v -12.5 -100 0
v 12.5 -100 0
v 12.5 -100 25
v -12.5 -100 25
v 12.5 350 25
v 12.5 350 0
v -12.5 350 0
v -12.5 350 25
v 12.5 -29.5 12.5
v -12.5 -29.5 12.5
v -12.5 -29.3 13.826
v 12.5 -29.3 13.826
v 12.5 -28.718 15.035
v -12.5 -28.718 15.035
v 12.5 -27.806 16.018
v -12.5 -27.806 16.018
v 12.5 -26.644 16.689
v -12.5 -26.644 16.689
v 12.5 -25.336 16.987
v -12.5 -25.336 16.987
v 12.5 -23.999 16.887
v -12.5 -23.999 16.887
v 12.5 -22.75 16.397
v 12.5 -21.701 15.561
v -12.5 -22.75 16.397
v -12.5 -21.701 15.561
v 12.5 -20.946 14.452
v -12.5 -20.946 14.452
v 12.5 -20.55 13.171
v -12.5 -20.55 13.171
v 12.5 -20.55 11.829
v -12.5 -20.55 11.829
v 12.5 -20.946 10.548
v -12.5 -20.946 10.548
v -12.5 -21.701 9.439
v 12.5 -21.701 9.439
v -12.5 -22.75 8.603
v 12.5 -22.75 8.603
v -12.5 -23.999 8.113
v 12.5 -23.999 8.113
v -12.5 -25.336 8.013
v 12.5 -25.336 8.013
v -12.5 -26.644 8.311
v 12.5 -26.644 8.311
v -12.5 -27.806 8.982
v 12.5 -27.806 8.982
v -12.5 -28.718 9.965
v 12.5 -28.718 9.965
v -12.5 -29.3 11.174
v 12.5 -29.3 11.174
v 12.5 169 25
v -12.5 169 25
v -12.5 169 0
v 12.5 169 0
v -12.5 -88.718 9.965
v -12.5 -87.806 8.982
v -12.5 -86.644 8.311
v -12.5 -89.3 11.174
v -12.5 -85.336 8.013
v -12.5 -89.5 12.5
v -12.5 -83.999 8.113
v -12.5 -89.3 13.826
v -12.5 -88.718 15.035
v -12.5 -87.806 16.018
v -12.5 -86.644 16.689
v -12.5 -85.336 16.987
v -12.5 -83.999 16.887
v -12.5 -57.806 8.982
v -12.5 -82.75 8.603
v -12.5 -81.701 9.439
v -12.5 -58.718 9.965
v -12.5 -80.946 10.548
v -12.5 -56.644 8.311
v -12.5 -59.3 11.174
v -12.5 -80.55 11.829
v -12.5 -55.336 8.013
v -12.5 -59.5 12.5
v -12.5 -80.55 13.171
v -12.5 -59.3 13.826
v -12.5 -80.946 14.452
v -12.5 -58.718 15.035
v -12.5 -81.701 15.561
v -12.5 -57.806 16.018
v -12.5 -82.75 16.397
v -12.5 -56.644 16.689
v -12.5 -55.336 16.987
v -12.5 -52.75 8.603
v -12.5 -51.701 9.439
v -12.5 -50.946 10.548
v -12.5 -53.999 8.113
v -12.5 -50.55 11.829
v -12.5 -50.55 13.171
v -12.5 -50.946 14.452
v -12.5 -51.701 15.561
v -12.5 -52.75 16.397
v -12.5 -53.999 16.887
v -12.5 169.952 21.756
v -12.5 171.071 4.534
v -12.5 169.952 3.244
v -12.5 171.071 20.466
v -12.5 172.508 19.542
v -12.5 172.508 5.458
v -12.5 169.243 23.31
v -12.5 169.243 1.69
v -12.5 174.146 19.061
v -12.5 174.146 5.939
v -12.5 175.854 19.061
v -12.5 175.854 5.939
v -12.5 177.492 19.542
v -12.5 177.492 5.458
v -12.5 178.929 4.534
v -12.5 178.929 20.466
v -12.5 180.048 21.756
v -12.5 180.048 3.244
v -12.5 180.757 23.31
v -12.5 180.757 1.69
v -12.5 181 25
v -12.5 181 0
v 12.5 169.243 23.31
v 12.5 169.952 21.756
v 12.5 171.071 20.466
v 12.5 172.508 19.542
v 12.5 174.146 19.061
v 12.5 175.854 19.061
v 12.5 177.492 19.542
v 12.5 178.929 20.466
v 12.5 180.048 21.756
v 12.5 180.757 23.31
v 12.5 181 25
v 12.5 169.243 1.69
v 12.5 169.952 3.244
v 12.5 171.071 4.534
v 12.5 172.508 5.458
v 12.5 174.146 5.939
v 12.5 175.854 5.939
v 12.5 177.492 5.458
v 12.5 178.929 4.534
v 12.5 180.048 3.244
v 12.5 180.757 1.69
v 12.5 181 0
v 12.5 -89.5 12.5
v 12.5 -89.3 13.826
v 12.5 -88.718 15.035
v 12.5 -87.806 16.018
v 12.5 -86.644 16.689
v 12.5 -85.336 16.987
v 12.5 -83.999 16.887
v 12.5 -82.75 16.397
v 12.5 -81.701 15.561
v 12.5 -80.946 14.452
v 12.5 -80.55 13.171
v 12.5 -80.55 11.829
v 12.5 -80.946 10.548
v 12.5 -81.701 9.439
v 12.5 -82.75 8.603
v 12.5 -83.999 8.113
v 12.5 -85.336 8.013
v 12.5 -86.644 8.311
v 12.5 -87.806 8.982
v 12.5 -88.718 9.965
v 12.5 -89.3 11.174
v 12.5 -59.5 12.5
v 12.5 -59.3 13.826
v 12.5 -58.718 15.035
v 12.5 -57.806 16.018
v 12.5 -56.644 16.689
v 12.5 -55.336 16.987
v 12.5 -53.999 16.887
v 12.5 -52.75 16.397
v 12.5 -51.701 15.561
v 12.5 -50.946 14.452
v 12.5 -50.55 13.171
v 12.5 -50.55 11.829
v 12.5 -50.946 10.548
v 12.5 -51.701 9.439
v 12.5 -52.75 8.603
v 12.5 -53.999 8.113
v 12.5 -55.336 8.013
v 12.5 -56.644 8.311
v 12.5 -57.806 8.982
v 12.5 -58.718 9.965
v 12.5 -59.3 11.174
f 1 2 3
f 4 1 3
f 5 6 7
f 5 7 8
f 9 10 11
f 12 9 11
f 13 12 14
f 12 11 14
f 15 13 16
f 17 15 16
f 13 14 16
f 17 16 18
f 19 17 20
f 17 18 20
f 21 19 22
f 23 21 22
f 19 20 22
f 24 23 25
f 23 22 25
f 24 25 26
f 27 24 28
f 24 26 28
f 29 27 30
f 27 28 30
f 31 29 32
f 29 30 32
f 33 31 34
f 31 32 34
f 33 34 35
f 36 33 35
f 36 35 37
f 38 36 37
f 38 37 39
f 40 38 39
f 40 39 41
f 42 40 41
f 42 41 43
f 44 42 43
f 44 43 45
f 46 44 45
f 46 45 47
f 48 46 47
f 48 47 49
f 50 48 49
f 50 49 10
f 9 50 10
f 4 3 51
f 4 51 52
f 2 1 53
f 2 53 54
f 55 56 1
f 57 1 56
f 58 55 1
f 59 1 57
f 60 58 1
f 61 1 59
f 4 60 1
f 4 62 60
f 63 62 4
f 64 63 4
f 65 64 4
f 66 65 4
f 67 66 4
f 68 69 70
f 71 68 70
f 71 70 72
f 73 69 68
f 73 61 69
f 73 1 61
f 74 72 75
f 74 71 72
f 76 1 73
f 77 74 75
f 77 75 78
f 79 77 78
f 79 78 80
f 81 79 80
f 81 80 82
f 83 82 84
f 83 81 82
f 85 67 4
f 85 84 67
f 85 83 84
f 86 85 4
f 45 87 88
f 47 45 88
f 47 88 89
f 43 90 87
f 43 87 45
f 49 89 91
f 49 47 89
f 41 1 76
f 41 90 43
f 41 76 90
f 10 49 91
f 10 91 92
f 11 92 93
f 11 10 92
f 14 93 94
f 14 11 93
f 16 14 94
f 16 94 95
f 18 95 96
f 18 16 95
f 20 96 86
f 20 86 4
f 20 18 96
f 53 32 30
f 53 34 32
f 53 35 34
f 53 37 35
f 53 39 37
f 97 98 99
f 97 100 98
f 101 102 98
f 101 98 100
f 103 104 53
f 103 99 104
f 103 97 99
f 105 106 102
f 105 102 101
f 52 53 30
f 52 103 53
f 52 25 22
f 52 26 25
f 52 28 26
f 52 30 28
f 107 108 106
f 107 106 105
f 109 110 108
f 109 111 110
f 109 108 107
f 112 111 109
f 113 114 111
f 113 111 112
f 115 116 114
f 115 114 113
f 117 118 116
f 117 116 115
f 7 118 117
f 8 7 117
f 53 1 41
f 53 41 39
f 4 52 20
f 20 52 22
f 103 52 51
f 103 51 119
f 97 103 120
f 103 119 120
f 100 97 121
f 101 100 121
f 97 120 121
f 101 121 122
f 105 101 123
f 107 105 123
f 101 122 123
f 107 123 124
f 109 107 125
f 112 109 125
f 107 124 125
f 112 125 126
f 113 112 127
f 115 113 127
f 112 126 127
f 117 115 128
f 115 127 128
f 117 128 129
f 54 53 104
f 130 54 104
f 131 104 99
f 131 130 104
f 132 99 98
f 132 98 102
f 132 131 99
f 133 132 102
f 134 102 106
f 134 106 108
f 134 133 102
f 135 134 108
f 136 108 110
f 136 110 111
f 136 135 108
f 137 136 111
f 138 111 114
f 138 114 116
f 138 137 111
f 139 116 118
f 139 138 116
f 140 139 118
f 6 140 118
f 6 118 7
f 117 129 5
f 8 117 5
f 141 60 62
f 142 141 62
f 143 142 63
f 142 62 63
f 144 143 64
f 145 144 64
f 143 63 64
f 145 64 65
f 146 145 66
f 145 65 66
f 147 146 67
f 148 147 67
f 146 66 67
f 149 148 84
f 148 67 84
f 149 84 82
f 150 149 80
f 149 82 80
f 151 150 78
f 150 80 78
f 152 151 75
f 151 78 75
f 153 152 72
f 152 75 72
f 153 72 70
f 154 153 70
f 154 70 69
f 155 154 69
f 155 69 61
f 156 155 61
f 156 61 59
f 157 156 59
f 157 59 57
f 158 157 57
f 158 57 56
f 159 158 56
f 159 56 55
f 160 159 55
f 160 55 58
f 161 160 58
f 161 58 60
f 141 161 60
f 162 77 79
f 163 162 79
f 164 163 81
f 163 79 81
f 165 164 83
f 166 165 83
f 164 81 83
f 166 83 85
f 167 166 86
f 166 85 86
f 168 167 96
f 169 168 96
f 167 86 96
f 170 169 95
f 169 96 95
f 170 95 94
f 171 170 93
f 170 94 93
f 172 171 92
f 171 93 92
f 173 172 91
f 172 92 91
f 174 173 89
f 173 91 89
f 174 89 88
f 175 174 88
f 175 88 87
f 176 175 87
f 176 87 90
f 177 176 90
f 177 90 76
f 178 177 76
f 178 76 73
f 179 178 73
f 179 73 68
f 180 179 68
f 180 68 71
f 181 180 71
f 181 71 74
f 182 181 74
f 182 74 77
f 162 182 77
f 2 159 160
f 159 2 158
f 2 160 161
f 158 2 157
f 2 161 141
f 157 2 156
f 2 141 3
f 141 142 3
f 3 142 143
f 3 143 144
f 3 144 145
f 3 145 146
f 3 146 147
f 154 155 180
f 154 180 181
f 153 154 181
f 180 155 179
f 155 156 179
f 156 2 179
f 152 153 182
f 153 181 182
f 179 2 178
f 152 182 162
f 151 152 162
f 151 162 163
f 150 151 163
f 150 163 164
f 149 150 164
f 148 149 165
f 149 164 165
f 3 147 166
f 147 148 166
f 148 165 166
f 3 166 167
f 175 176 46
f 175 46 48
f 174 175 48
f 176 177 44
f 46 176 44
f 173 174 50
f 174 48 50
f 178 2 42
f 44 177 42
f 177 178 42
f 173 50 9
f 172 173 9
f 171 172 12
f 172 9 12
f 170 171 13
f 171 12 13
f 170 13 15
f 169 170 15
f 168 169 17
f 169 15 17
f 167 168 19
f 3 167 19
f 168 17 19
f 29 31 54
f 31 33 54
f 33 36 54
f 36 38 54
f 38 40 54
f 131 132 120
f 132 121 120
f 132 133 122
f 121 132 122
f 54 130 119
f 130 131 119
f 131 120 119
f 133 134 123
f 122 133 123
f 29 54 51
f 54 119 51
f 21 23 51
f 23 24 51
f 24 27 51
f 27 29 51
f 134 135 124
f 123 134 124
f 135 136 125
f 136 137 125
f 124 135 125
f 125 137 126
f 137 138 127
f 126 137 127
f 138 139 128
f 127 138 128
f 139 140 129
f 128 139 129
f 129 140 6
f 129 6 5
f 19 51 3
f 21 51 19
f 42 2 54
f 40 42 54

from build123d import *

# Parameters (mm, degrees)
F0_W          = 350
F0_H          = 25
F1_DEPTH      = 12.5
F1_DEPTH_BACK = 12.5
F3_DEPTH      = 25
F5_DEPTH      = 100
F7_D          = 9


# Not quite as in the source:
# - a pattern or mirror of a feature is missing from the dataset's text; its kind, count and spacing are read off the source's solid


with BuildPart() as f1:
    # F0 (on Right) → F1 (new body, two sides)
    with BuildSketch(Plane.YZ) as f1_sk:
        with Locations((175, 12.5)):
            Rectangle(F0_W, F0_H)
    extrude(amount=F1_DEPTH)
    extrude(f1_sk.sketch, amount=-F1_DEPTH_BACK)

    # F2 (on face) → F3 (cut)
    with BuildSketch(Plane.YZ.offset(12.5)):
        with BuildLine():
            ThreePointArc((169, 25), (175, 19), (181, 25))
            Line((181, 25), (169, 25))
        make_face()
    f3 = extrude(amount=-F3_DEPTH, mode=Mode.SUBTRACT)

    # F3_copies: F3 across plane
    add(f3.mirror(Plane(origin=(0, 0, 12.5), x_dir=(-1, 0, 0), z_dir=(0, 0, -1))), mode=Mode.SUBTRACT)

    # F5 (add): a face of the model
    f5_faces = [f1.faces().sort_by_distance(p)[0] for p in [
        (0, 0, 12.5),
    ]]
    extrude(f5_faces, amount=F5_DEPTH)

    # F7 (through all)
    with Locations(Plane.YZ.offset(12.5)):
        with Locations((-85, 12.5), (-55, 12.5), (-25, 12.5)):
            Hole(F7_D / 2)


solid = f1.part
